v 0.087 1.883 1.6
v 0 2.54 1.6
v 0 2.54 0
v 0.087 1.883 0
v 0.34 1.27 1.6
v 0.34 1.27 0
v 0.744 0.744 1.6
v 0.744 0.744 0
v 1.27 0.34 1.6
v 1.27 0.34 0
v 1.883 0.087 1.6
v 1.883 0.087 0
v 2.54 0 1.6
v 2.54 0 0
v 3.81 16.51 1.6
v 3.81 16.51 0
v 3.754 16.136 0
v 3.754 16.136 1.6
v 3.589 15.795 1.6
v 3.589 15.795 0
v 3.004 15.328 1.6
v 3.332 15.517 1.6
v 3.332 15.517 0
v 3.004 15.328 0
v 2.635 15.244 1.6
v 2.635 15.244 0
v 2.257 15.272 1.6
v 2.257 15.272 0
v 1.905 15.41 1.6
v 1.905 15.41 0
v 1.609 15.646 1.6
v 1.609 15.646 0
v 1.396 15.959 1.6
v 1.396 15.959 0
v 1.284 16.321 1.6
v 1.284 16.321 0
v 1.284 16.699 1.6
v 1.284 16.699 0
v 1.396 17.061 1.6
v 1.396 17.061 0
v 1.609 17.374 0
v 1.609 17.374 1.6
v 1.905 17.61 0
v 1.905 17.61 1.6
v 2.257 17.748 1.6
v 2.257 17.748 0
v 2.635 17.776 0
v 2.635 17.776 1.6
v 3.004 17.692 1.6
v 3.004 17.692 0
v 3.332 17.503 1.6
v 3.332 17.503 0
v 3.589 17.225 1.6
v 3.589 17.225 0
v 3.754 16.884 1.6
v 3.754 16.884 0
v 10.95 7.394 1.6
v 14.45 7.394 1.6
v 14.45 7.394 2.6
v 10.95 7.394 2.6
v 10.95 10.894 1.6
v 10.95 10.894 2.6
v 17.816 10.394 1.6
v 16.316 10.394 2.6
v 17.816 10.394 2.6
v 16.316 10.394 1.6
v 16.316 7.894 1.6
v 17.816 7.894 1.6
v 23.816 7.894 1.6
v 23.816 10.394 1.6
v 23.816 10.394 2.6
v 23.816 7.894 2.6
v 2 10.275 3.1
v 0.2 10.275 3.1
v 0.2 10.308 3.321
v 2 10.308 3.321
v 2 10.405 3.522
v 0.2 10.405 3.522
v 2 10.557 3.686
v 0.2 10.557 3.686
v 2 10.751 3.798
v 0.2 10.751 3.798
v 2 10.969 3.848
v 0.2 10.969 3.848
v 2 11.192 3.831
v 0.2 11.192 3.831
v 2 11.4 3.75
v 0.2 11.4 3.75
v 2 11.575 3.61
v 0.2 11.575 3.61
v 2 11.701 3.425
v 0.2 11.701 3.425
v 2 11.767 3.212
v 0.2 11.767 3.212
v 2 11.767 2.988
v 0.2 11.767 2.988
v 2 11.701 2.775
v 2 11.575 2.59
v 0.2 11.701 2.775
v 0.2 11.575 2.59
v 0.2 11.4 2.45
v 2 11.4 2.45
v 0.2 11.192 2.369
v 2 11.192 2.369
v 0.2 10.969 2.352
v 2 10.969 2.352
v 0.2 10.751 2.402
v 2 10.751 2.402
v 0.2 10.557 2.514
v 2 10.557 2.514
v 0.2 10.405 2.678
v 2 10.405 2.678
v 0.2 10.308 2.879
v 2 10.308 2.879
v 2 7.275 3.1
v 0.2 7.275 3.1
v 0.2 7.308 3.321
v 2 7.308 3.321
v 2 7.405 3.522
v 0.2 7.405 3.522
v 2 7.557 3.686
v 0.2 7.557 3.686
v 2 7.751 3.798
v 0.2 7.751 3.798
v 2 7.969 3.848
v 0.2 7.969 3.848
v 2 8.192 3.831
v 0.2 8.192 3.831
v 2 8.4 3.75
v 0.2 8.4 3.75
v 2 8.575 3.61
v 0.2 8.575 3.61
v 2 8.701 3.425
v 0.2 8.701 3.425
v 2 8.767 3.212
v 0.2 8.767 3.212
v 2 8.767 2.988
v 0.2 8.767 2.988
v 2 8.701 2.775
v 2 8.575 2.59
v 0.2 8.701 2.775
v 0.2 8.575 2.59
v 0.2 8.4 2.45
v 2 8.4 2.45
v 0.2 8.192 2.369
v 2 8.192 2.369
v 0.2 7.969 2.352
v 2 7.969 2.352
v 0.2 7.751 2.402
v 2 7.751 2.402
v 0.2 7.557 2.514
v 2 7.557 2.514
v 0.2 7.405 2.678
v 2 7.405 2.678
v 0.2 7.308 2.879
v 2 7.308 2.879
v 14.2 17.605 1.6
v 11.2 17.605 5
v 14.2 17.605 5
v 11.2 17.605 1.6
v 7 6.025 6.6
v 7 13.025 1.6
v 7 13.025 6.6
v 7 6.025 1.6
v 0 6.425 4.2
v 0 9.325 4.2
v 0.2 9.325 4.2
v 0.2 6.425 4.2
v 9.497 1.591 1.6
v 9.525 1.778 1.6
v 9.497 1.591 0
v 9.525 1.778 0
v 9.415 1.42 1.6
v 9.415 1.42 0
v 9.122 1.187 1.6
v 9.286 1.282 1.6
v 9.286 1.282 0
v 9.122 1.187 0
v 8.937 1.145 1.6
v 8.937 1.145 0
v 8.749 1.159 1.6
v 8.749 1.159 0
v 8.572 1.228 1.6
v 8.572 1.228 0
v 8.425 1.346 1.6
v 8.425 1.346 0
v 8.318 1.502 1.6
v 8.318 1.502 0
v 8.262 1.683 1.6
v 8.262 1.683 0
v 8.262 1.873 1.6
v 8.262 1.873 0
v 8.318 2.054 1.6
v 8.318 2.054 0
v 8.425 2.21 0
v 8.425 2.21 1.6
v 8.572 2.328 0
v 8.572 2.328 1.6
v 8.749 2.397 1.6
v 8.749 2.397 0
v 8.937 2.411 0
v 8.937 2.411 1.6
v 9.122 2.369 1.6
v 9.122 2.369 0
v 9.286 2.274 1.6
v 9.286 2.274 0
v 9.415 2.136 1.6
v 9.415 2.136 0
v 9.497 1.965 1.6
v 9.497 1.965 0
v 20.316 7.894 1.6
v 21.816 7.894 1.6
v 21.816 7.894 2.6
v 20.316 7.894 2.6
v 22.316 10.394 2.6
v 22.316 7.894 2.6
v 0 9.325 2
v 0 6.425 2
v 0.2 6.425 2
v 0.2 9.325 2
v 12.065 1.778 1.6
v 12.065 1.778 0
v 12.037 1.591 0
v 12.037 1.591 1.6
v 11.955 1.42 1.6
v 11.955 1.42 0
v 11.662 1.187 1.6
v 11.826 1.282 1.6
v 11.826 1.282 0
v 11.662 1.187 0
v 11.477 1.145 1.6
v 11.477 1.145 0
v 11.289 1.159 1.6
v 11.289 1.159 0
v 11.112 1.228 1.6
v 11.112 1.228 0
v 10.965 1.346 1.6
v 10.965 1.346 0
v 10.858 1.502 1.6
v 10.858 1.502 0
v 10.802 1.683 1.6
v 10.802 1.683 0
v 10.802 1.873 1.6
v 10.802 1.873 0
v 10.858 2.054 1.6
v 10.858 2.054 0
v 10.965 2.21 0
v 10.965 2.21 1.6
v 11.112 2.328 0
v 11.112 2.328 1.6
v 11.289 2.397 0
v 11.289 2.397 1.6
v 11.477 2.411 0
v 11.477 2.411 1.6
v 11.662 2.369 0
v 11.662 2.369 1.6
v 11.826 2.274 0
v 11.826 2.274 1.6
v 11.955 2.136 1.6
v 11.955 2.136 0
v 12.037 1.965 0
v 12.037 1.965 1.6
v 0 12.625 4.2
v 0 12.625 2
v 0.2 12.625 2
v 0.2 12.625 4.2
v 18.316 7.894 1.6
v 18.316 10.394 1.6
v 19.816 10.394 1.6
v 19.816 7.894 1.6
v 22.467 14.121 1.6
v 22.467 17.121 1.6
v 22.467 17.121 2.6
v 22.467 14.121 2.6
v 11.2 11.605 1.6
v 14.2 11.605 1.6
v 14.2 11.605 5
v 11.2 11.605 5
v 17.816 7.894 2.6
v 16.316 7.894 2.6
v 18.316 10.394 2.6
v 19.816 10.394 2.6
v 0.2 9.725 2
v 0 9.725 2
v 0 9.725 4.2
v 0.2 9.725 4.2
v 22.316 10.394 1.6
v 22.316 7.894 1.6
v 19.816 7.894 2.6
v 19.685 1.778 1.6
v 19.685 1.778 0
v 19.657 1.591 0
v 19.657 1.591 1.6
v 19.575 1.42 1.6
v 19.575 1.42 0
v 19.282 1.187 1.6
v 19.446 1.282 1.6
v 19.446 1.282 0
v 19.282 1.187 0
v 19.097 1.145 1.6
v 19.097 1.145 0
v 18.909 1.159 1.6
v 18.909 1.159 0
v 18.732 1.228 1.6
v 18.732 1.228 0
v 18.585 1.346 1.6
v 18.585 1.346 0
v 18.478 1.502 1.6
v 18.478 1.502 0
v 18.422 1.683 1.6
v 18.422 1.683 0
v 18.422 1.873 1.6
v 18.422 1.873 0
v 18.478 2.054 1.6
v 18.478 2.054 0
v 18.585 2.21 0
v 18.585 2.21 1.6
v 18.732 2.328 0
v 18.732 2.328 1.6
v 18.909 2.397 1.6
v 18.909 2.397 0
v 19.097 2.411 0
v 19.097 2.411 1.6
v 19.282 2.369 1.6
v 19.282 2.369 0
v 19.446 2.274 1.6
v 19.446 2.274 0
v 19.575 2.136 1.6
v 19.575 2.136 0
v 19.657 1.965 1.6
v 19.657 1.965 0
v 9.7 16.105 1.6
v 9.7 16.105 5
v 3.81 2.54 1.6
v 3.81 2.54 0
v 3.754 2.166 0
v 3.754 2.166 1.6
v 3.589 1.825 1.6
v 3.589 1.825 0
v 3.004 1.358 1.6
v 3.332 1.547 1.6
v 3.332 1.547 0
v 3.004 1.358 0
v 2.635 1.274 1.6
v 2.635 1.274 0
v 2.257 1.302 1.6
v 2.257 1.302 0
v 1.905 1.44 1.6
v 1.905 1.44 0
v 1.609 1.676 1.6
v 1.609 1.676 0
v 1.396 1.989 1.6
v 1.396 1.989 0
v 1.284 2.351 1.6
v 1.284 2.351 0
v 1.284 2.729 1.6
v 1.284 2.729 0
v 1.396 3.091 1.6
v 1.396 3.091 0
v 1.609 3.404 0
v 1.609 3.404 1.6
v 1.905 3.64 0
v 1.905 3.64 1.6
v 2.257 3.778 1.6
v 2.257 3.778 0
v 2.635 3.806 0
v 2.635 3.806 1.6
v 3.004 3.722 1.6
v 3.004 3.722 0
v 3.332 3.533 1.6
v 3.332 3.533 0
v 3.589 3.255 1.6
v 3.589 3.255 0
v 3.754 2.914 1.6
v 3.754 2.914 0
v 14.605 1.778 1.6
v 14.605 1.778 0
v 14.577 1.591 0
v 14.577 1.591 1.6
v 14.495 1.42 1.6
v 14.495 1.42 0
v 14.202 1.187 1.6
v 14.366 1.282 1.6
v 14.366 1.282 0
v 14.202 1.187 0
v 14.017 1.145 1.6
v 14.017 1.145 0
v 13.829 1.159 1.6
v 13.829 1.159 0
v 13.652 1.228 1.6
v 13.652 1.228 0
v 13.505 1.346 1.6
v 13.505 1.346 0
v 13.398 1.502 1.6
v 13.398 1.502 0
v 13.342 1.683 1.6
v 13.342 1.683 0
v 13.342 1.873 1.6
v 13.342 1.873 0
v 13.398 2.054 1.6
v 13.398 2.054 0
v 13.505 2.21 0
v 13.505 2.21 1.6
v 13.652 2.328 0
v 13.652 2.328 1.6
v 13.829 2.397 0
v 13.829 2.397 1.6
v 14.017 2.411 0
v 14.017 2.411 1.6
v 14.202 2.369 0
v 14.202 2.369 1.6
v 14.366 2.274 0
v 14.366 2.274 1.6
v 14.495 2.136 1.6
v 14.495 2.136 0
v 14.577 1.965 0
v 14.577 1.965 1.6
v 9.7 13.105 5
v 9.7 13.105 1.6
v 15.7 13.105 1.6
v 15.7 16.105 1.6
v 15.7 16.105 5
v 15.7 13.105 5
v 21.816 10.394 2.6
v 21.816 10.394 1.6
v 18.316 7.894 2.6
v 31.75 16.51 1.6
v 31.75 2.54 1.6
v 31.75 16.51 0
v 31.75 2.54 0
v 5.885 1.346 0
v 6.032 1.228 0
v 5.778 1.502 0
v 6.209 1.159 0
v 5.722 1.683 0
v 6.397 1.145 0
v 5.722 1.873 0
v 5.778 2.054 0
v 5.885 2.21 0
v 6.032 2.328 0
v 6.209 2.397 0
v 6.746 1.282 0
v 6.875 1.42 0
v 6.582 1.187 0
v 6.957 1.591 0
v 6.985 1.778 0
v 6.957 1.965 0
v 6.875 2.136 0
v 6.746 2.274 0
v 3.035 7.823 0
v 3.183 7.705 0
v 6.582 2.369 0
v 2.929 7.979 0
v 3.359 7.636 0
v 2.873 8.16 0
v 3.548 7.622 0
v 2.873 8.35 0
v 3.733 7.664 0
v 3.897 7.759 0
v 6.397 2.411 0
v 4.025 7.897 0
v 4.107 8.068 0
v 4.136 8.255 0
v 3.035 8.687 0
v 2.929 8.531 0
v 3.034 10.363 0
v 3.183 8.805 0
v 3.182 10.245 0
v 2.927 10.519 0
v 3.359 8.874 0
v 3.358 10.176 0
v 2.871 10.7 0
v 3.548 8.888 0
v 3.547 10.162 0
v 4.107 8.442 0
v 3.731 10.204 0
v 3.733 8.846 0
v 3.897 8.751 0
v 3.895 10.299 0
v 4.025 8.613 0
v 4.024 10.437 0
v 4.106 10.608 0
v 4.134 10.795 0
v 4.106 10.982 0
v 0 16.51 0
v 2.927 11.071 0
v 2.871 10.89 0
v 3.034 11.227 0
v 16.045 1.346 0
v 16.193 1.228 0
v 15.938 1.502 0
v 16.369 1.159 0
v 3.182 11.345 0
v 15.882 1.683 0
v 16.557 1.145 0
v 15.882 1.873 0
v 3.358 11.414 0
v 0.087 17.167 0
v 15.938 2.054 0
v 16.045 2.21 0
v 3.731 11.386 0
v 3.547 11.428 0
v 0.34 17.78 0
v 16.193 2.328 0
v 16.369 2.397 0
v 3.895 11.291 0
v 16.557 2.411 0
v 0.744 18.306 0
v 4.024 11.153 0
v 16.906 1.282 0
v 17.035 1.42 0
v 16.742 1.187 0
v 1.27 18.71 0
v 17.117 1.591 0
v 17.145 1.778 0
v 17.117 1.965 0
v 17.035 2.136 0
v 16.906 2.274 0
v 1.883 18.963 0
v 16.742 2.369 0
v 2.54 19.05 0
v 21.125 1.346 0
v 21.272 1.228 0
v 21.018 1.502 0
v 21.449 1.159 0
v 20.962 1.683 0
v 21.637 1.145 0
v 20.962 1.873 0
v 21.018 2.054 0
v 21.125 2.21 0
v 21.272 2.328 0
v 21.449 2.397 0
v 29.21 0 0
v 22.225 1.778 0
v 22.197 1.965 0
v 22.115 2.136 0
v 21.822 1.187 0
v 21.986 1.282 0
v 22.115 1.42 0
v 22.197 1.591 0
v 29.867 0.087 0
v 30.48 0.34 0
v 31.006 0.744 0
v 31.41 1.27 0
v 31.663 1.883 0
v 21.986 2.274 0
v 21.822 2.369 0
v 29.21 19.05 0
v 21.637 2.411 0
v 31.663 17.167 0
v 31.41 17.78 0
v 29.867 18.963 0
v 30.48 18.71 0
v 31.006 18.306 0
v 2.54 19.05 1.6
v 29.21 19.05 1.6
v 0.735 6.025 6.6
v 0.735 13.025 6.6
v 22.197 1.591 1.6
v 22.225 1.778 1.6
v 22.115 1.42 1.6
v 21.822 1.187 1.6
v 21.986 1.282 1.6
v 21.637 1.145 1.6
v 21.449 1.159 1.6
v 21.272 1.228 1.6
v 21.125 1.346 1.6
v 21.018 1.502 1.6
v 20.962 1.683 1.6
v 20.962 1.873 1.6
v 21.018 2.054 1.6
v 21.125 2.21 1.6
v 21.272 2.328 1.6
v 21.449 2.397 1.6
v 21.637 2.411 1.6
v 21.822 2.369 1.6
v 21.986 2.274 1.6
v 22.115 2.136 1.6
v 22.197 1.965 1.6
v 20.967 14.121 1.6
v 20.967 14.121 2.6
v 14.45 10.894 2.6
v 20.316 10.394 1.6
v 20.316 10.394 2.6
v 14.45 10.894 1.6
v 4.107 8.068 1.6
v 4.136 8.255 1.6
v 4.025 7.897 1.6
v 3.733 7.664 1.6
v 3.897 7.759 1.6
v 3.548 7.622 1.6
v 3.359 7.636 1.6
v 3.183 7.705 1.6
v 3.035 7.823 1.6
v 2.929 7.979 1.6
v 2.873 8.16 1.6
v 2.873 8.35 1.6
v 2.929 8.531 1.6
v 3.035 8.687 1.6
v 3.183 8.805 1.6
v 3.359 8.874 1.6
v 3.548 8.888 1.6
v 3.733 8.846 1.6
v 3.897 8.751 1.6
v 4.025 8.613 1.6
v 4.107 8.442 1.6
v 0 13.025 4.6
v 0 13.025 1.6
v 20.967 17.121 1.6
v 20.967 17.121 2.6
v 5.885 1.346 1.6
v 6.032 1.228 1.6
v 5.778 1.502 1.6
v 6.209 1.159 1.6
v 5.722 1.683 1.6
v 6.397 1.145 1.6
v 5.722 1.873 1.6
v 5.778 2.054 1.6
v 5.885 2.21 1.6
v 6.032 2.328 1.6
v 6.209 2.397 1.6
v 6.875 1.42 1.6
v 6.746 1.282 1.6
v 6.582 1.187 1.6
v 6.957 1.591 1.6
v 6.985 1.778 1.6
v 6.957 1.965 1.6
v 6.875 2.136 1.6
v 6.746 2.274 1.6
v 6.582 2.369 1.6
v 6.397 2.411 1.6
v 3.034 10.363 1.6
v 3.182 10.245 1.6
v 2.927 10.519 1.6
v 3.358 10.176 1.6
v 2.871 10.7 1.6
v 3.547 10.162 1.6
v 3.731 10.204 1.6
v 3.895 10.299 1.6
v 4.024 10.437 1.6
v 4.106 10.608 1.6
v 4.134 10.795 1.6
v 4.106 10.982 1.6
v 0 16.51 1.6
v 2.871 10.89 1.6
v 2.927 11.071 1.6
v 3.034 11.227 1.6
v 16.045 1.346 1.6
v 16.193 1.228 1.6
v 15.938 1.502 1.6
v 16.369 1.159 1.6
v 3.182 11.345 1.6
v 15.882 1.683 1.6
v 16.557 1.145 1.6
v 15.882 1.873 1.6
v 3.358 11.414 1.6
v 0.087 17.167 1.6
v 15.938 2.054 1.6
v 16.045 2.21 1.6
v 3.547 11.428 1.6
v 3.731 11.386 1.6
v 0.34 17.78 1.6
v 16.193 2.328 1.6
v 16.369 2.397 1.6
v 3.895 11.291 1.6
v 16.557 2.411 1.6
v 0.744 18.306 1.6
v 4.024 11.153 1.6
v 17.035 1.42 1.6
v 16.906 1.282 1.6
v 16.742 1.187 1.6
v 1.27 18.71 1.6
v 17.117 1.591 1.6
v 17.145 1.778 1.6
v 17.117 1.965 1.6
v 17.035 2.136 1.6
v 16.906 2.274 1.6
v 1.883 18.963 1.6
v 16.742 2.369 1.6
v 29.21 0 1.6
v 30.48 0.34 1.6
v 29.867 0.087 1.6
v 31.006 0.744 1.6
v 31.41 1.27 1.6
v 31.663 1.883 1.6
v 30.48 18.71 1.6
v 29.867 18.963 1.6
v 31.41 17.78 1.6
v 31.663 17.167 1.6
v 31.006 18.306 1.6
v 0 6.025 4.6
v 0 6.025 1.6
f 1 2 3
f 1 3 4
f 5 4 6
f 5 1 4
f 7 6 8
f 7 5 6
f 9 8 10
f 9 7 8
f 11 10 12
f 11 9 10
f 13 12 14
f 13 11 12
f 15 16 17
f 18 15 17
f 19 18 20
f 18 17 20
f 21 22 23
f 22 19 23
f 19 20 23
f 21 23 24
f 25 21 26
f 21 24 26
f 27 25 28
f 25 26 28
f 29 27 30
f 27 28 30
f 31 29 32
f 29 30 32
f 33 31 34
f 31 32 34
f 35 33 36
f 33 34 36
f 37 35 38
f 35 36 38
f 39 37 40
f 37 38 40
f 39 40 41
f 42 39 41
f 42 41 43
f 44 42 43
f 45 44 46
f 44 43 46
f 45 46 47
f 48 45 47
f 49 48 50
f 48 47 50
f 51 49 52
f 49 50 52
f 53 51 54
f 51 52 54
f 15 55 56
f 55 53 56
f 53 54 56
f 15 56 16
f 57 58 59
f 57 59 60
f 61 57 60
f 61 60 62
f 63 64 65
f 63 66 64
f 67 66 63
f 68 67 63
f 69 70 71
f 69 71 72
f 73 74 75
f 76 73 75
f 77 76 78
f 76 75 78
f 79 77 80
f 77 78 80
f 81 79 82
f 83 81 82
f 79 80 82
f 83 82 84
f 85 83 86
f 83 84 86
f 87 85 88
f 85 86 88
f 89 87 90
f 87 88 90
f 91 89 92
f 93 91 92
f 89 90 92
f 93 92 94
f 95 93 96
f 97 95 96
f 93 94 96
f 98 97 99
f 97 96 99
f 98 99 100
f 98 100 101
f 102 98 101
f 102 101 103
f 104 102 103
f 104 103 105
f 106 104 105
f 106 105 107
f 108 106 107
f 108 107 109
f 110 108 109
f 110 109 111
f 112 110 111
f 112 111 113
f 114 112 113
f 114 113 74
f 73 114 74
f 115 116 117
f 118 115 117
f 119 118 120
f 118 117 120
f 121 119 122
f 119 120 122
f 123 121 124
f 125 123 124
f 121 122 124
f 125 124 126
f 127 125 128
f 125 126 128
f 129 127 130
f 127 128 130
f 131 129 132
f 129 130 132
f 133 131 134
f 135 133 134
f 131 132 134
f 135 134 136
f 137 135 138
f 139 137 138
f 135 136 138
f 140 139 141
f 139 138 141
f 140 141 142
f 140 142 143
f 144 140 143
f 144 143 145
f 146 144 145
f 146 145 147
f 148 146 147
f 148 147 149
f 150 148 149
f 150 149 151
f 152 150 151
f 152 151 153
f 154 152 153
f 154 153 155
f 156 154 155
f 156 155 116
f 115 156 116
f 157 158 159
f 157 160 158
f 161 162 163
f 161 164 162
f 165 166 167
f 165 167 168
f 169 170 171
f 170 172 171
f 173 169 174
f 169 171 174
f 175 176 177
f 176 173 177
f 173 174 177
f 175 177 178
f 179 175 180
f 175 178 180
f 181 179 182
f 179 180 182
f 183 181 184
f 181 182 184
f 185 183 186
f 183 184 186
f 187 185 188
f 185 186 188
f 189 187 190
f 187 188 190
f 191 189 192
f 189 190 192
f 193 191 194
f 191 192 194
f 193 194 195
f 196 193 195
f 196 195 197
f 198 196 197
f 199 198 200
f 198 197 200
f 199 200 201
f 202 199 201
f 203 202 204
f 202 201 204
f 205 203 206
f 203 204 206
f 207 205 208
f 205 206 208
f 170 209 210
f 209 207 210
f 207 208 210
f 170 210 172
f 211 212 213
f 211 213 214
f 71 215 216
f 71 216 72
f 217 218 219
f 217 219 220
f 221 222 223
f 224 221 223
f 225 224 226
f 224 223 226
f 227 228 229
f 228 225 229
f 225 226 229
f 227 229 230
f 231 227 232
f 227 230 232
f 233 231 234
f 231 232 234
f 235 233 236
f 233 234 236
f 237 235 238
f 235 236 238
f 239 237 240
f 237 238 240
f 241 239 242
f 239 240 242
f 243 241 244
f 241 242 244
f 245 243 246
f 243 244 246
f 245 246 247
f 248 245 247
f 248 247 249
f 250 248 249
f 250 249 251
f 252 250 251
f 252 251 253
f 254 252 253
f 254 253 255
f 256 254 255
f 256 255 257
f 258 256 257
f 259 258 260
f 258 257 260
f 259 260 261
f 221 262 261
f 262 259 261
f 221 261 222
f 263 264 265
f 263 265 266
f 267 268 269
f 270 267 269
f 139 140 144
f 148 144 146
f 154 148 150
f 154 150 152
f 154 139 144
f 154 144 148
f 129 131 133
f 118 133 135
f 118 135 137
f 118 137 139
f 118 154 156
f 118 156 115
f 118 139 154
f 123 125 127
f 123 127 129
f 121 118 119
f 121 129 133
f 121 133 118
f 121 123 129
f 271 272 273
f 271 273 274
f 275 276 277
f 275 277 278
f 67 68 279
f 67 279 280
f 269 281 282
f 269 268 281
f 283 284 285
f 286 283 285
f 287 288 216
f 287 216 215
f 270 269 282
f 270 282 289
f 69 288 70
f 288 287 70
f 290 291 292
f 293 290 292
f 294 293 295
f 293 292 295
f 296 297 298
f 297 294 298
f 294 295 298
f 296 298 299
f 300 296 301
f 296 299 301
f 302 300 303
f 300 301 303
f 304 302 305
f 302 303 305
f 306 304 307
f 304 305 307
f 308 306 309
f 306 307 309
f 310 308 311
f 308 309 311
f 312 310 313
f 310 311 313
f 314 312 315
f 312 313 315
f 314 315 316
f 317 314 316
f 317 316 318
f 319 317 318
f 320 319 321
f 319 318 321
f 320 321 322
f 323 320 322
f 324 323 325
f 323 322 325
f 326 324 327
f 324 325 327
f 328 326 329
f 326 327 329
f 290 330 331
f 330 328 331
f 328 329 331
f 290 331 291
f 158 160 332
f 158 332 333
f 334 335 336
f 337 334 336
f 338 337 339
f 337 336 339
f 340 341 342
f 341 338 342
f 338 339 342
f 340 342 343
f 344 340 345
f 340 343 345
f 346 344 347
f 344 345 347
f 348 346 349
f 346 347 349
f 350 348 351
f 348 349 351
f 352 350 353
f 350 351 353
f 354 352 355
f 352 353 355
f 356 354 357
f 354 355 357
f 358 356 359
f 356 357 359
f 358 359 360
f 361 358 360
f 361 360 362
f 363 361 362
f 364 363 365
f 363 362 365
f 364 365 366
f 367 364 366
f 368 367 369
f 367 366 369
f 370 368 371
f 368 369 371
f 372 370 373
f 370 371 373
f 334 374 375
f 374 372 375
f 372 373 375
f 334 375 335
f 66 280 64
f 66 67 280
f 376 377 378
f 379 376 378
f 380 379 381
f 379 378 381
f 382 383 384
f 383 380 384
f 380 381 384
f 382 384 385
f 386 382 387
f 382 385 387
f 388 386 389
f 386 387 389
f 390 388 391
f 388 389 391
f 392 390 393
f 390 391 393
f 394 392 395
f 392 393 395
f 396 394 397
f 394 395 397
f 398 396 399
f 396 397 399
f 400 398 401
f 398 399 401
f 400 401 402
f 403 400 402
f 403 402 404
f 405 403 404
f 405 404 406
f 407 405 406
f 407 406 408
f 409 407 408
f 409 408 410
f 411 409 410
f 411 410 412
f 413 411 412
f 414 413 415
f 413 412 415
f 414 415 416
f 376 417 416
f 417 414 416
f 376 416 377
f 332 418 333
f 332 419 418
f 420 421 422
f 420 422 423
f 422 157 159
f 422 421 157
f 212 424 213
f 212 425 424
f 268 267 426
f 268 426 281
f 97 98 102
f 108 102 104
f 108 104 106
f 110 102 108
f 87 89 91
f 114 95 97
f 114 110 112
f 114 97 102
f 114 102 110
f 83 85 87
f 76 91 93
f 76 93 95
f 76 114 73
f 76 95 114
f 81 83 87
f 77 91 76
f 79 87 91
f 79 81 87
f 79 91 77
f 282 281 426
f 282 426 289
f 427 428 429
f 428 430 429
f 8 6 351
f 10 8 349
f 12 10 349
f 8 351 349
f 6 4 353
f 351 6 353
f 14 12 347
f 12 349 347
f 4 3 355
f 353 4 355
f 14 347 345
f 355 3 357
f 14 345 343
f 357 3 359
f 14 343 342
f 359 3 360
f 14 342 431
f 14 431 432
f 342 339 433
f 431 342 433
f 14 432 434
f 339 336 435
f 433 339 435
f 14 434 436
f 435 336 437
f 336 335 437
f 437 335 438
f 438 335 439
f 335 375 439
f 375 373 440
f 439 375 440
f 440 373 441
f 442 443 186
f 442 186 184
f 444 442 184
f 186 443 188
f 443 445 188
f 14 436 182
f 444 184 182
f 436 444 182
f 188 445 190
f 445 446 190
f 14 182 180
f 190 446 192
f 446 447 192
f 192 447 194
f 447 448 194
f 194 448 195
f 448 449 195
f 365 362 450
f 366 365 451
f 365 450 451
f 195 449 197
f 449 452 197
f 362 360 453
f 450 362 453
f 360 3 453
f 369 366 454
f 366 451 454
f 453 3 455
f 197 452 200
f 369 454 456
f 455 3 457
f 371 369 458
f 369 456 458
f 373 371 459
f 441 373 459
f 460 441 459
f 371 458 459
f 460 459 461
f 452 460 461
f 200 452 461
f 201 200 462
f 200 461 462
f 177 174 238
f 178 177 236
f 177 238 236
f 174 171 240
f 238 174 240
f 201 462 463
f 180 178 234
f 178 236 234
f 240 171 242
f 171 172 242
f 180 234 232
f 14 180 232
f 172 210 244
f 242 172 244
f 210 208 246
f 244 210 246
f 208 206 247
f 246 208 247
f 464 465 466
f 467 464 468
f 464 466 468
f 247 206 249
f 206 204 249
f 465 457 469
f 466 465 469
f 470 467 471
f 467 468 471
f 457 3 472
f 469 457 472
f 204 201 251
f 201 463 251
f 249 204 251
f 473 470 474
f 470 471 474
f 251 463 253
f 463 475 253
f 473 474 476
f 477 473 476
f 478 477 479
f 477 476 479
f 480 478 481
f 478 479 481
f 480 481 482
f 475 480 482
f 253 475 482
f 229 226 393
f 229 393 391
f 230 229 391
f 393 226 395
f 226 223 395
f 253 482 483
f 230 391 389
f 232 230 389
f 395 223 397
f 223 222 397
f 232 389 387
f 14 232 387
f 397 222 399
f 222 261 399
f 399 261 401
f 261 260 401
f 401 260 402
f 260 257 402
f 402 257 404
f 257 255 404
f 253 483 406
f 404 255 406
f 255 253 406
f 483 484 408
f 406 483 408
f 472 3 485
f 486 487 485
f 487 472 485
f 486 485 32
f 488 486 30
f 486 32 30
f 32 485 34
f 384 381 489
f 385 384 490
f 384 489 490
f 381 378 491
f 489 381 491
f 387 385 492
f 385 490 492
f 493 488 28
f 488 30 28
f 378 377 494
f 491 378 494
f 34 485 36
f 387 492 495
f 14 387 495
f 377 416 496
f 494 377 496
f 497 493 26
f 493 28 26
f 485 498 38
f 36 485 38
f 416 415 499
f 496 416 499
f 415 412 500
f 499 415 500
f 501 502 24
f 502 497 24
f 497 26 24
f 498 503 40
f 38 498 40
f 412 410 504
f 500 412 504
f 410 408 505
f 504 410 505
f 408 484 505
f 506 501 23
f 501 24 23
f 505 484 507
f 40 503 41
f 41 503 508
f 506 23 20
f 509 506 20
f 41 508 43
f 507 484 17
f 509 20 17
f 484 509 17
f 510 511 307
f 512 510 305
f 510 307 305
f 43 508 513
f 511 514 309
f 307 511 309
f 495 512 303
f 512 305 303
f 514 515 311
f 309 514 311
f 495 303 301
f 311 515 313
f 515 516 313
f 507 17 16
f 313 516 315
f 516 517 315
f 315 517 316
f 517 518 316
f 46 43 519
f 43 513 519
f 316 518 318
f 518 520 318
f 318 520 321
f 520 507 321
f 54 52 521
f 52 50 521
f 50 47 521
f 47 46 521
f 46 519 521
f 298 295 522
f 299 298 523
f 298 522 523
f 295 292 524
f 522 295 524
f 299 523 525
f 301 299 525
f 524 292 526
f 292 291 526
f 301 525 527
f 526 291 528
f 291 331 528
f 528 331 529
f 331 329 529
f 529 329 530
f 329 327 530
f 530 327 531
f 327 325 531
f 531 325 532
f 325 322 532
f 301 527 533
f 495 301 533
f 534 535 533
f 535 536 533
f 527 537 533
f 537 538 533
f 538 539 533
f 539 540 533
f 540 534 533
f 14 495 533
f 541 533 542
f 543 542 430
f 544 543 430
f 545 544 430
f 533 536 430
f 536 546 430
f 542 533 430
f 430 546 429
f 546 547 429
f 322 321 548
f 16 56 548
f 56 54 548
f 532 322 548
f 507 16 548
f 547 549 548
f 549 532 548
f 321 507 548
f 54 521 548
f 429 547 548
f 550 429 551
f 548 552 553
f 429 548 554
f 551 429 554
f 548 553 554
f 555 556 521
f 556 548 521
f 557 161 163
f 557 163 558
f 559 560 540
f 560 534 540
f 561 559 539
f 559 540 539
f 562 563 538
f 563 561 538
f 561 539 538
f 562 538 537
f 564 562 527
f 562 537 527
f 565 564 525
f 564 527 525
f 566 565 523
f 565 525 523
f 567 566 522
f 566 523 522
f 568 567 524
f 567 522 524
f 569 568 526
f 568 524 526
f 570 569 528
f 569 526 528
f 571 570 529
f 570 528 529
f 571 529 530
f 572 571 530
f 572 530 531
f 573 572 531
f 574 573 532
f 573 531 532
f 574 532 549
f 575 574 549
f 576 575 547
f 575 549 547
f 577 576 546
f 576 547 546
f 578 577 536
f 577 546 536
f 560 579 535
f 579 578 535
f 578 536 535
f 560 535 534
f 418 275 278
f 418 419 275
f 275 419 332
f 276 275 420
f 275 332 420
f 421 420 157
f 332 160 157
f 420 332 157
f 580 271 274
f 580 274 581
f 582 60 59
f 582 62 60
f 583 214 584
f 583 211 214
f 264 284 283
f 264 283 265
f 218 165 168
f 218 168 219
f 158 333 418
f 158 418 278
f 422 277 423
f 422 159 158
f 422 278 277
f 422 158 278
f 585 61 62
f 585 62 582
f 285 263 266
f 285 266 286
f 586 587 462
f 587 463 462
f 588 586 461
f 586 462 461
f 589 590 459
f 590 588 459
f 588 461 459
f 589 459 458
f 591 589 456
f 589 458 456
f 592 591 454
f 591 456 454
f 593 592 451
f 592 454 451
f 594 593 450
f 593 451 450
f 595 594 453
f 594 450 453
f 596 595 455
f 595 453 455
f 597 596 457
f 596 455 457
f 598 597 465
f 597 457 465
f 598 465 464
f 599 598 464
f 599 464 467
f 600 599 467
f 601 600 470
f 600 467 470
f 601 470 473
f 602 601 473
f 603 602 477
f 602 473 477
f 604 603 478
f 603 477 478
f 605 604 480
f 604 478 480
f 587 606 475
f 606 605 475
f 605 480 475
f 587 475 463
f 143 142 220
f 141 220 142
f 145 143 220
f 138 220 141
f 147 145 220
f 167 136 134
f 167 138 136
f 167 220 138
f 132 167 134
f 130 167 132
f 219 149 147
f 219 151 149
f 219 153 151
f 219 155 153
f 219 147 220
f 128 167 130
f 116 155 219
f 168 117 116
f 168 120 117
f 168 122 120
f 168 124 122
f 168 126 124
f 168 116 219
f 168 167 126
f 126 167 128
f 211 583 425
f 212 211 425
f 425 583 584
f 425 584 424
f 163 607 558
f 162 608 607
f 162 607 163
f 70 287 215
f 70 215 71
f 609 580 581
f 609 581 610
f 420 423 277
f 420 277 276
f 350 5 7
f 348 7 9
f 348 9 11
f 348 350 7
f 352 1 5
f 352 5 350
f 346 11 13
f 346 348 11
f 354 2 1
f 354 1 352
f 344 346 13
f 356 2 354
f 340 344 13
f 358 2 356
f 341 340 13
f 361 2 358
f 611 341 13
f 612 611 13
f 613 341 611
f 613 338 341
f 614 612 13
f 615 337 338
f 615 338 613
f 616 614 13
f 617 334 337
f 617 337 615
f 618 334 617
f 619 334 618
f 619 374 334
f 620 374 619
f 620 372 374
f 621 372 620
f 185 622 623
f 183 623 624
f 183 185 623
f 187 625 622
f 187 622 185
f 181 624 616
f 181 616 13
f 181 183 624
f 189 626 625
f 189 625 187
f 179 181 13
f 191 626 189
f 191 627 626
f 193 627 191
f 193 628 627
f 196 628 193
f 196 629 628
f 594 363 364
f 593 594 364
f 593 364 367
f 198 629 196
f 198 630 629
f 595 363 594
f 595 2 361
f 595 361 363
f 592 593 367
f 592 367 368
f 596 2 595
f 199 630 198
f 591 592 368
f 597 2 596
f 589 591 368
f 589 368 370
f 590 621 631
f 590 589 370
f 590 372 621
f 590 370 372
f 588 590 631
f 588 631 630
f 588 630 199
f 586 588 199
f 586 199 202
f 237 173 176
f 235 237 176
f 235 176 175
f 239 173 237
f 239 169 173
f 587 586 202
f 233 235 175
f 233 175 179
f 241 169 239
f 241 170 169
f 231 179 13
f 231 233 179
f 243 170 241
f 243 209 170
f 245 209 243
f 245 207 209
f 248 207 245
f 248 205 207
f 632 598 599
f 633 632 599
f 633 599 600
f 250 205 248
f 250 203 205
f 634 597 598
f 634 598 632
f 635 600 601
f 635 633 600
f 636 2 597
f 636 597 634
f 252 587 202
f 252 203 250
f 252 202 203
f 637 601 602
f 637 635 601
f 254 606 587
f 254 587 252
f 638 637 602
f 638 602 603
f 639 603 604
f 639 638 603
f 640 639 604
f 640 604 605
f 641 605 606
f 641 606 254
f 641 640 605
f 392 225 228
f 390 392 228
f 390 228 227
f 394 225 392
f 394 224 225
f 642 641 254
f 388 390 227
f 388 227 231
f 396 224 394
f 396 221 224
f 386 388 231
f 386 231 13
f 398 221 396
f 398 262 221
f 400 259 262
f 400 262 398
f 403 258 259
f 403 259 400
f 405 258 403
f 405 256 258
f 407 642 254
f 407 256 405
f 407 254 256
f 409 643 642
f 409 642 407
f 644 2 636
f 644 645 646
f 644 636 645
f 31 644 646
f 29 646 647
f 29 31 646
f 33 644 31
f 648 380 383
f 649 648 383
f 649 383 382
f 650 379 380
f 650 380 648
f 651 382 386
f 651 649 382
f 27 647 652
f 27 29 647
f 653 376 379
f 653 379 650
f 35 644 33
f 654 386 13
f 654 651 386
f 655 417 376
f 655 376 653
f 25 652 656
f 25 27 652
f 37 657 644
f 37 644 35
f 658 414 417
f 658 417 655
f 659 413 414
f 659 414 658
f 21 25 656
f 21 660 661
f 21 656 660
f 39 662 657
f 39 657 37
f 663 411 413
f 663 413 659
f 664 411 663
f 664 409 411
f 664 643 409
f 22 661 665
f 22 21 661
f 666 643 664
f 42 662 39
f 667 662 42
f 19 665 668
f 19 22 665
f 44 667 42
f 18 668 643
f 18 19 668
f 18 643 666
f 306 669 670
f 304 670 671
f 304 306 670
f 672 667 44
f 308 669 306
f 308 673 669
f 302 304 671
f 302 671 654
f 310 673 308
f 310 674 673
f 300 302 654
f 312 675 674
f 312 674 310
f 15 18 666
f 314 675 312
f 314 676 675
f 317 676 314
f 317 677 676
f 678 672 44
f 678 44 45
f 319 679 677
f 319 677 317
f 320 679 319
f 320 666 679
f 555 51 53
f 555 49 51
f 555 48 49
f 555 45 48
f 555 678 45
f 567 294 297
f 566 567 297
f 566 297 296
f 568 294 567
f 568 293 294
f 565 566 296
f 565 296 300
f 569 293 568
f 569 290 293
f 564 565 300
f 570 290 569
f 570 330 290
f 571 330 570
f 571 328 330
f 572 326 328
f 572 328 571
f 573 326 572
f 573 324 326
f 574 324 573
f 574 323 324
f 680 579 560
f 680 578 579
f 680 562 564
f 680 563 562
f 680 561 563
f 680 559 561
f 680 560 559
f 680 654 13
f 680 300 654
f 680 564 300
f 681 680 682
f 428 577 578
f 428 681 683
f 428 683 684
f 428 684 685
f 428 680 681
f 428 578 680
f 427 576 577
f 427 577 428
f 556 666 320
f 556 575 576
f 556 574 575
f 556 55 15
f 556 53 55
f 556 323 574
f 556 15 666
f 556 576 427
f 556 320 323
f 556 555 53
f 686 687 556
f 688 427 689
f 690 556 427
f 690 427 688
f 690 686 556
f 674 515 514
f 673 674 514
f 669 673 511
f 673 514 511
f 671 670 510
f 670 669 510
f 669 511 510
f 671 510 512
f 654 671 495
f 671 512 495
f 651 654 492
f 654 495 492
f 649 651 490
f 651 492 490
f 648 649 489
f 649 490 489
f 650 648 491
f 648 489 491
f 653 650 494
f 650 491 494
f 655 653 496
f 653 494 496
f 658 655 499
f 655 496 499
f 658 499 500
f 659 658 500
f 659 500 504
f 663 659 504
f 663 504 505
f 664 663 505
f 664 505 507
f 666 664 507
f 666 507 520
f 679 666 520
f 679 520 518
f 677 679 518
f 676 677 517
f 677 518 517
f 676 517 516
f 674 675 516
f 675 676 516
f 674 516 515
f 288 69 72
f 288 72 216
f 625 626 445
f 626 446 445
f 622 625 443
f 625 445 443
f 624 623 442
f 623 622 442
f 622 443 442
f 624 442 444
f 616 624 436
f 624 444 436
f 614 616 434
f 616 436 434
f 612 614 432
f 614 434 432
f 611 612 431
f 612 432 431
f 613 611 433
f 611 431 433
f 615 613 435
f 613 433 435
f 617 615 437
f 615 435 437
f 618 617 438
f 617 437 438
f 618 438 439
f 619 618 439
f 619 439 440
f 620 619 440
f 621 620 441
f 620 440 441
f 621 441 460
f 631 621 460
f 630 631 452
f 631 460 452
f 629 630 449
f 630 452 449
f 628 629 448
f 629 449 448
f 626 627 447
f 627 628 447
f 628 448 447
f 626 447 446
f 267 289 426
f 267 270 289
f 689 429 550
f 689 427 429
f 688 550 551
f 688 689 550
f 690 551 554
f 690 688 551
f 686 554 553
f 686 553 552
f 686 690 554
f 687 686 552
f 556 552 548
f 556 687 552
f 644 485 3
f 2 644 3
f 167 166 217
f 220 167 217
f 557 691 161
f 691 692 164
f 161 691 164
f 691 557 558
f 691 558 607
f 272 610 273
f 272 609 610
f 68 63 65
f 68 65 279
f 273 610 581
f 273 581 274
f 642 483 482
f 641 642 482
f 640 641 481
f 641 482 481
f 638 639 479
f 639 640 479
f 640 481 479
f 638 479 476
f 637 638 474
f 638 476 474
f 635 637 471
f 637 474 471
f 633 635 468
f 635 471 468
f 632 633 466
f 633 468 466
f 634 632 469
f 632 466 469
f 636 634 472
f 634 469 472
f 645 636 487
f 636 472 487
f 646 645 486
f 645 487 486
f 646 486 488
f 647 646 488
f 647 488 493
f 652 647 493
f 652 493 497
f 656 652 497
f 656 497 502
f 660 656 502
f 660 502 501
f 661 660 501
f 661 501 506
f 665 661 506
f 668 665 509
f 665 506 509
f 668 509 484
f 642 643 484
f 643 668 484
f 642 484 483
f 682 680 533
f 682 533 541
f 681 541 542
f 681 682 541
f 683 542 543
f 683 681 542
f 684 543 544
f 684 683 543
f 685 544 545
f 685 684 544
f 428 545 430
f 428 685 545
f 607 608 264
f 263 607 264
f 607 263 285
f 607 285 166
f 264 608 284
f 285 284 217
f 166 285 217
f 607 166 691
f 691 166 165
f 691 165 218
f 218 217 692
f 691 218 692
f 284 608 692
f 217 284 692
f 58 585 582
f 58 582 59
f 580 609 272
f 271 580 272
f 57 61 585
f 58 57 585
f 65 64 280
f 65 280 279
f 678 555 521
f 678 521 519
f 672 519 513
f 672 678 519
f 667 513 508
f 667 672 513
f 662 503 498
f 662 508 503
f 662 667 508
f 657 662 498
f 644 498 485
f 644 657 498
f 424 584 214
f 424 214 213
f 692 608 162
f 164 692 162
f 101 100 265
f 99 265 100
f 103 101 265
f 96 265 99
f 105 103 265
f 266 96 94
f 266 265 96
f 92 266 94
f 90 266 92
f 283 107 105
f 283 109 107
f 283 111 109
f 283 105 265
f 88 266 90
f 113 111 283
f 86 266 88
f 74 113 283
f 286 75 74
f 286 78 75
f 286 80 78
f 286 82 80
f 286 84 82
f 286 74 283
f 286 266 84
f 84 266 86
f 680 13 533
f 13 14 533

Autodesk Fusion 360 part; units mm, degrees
sketch "Sketch1" plane through (0, 0, 0) normal (0, 0, 1) x (1, 0, 0)
  line L0 (0, 0) -> (31.75, 0)
  line L1 (31.75, 0) -> (31.75, 19.05)
  line L2 (31.75, 19.05) -> (0, 19.05)
  line L3 (0, 19.05) -> (0, 0)
  circle A0 centre (2.54, 2.54) radius 1.27
  circle A1 centre (2.54, 16.51) radius 1.27
  line L4 (7, 6.025) -> (0, 6.025)
  line L5 (0, 6.025) -> (0, 13.025)
  line L6 (0, 13.025) -> (7, 13.025)
  line L7 (7, 13.025) -> (7, 6.025)
  line L8 (7, 6.025) -> (0, 13.025) construction
  line L9 (0, 6.025) -> (7, 13.025) construction
  circle A2 centre (3.4993, 10.795) radius 0.635
  circle A3 centre (3.5007, 8.255) radius 0.635
  line L10 (3.4993, 10.795) -> (3.5007, 8.255) construction
  line L11 (15.7, 11.605) -> (9.7, 11.605)
  line L12 (9.7, 11.605) -> (9.7, 17.605)
  line L13 (9.7, 17.605) -> (15.7, 17.605)
  line L14 (15.7, 17.605) -> (15.7, 11.605)
  line L15 (15.7, 11.605) -> (9.7, 17.605) construction
  line L16 (9.7, 11.605) -> (15.7, 17.605) construction
  line L17 (14.45, 7.394) -> (10.95, 7.394)
  line L18 (10.95, 7.394) -> (10.95, 10.894)
  line L19 (10.95, 10.894) -> (14.45, 10.894)
  line L20 (14.45, 10.894) -> (14.45, 7.394)
  line L21 (14.45, 7.394) -> (10.95, 10.894) construction
  line L22 (10.95, 7.394) -> (14.45, 10.894) construction
  line L23 (17.8162, 7.894) -> (16.3162, 7.894)
  line L24 (16.3162, 7.894) -> (16.3162, 10.394)
  line L25 (16.3162, 10.394) -> (17.8162, 10.394)
  line L26 (17.8162, 10.394) -> (17.8162, 7.894)
  line L27 (17.8162, 7.894) -> (16.3162, 10.394) construction
  line L28 (16.3162, 7.894) -> (17.8162, 10.394) construction
  line L29 (22.467, 14.121) -> (20.967, 14.121)
  line L30 (20.967, 14.121) -> (20.967, 17.121)
  line L31 (20.967, 17.121) -> (22.467, 17.121)
  line L32 (22.467, 17.121) -> (22.467, 14.121)
  line L33 (22.467, 14.121) -> (20.967, 17.121) construction
  line L34 (20.967, 14.121) -> (22.467, 17.121) construction
  circle A4 centre (13.97, 1.778) radius 0.635
  point P0 (3.5, 9.525)
  point P1 (12.7, 14.605)
  point P2 (12.7, 9.144)
  point P3 (17.0662, 9.144)
  point P4 (21.717, 15.621)
  dimension "d1" = 31.75
  dimension "d2" = 19.05
  dimension "d3" = 2.54
  dimension "d4" = 2.54
  dimension "d5" = 2.54
  dimension "d6" = 2.54
  dimension "d7" = 16.51
  dimension "d8" = 2.54
  dimension "d12" = 7
  dimension "d13" = 7
  dimension "d14" = 9.525
  dimension "d15" = 1.27
  dimension "d16" = 1.27
  dimension "d17" = 2.54
  dimension "d18" = 6
  dimension "d19" = 6
  dimension "d20" = 14.605
  dimension "d21" = 12.7
  dimension "d26" = 3.5
  dimension "d27" = 3.5
  dimension "d28" = 9.144
  dimension "d29" = 12.7
  dimension "d33" = 2.5
  dimension "d34" = 1.5
  dimension "d35" = 9.144
  dimension "d43" = 3
  dimension "d44" = 1.5
  dimension "d45" = 21.717
  dimension "d46" = 15.621
  dimension "d50" = 1.27
  dimension "d51" = 1.778
  dimension "d52" = 13.97
extrude "Extrude1" add sketch "Sketch1" along normal blind 1.6 contours L0 L1 L2 L3 L4 L6 L7 | L3 L4 L5 L6 L7 | L11 L12 L13 L14 | L17 L18 L19 L20 | L23 L24 L25 L26 | L29 L30 L31 L32 | A4 makes body 1
fillet "Fillet1" radius 2.54 4 edges at (0, 0, 0.8) (0, 19.05, 0.8) (31.75, 19.05, 0.8) (31.75, 0, 0.8) on bodies 1
extrude "Extrude2" add sketch "Sketch1" along normal blind 3.4 from surface at 1.6 separate body contours L11 L12 L13 L14 makes body 2
chamfer "Chamfer1" distance 1.5 angle 45 4 edges at (9.7, 11.605, 3.3) (9.7, 17.605, 3.3) (15.7, 17.605, 3.3) (15.7, 11.605, 3.3) on bodies 2
extrude "Extrude3" add sketch "Sketch1" along normal blind 1 from surface at 1.6 separate body contours L17 L18 L19 L20 makes body 3
extrude "Extrude4" add sketch "Sketch1" along normal blind 1 from surface at 1.6 separate body contours L23 L24 L25 L26 makes body 4
pattern_linear "R-Pattern1" count 4 spacing 2 along (1, 0, 0) of "Extrude4" makes body 5 makes body 6 makes body 7
extrude "Extrude5" add sketch "Sketch1" along normal blind 1 from surface at 1.6 separate body contours L29 L30 L31 L32 makes body 8
extrude "Extrude6" cut sketch "Sketch1" along normal up to surface (1.6 mm away) contours A4 bodies 1
pattern_linear "R-Pattern2" count 4 spacing 2.54 along (1, 0, 0) of "Extrude6"
pattern_linear "R-Pattern3" count 4 spacing 2.54 along (-1, 0, 0) of "Extrude6"
extrude "Extrude7" add sketch "Sketch1" along normal blind 3 from surface at 1.6 separate body contours L3 L4 L5 L6 L7 | A2 | A3 makes body 9
sketch "Sketch2" plane through (0, 0, 4.6) normal (0, 0, 1) x (-1, 0, 0)
  line L0 (-7, -6.025) -> (-7, -13.025)
  line L1 (-7, -13.025) -> (0, -13.025)
  line L2 (0, -13.025) -> (0, -6.025)
  line L3 (0, -6.025) -> (-7, -6.025)
sketch "Sketch3" plane through (0, 0, 0) normal (0, 1, 0) x (1, 0, 0)
  line L0 (7, -4.6) -> (0, -4.6)
  line L1 (7, -4.6) -> (7, -6.6)
  line L2 (7, -6.6) -> (0.7347, -6.6)
  line L3 (0.7347, -6.6) -> (0, -4.6)
  point P0 (7, -4.6)
  dimension "d66" = 2
extrude "Extrude8" add sketch "Sketch3" along normal up to surface (7 mm away) from surface at 6.025 bodies 9
sketch "Sketch4" plane through (0, 0, 0) normal (-1, 0, 0) x (0, -1, 0)
  line L0 (-13.025, 1.6) -> (-6.025, 1.6)
  line L1 (-6.025, 1.6) -> (-6.025, 4.6)
  line L2 (-6.025, 4.6) -> (-13.025, 4.6)
  line L3 (-13.025, 4.6) -> (-13.025, 1.6)
  line L4 (-6.025, 3.1) -> (-13.025, 3.1) construction
  circle A0 centre (-11.025, 3.1) radius 0.75
  circle A1 centre (-8.025, 3.1) radius 0.75
  line L5 (-12.625, 4.2) -> (-6.425, 4.2)
  line L6 (-6.425, 4.2) -> (-6.425, 2)
  line L7 (-6.425, 2) -> (-12.625, 2)
  line L8 (-12.625, 2) -> (-12.625, 4.2)
  line L9 (-9.725, 4.2) -> (-9.325, 4.2)
  line L10 (-9.325, 4.2) -> (-9.325, 2)
  line L11 (-9.325, 2) -> (-9.725, 2)
  line L12 (-9.725, 2) -> (-9.725, 4.2)
  dimension "d70" = 1.5
  dimension "d71" = 1.5
  dimension "d72" = 3
  dimension "d73" = 2
  dimension "d76" = 0.4
  dimension "d77" = 0.4
  dimension "d78" = 0.4
  dimension "d79" = 0.4
  dimension "d82" = 0.4
extrude "Extrude9" cut sketch "Sketch4" against normal blind 2 contours A0 | A1 bodies 9
extrude "Extrude10" cut sketch "Sketch4" against normal blind 0.2 contours L5 L7 L8 L12 | L5 L6 L7 L10 bodies 9
